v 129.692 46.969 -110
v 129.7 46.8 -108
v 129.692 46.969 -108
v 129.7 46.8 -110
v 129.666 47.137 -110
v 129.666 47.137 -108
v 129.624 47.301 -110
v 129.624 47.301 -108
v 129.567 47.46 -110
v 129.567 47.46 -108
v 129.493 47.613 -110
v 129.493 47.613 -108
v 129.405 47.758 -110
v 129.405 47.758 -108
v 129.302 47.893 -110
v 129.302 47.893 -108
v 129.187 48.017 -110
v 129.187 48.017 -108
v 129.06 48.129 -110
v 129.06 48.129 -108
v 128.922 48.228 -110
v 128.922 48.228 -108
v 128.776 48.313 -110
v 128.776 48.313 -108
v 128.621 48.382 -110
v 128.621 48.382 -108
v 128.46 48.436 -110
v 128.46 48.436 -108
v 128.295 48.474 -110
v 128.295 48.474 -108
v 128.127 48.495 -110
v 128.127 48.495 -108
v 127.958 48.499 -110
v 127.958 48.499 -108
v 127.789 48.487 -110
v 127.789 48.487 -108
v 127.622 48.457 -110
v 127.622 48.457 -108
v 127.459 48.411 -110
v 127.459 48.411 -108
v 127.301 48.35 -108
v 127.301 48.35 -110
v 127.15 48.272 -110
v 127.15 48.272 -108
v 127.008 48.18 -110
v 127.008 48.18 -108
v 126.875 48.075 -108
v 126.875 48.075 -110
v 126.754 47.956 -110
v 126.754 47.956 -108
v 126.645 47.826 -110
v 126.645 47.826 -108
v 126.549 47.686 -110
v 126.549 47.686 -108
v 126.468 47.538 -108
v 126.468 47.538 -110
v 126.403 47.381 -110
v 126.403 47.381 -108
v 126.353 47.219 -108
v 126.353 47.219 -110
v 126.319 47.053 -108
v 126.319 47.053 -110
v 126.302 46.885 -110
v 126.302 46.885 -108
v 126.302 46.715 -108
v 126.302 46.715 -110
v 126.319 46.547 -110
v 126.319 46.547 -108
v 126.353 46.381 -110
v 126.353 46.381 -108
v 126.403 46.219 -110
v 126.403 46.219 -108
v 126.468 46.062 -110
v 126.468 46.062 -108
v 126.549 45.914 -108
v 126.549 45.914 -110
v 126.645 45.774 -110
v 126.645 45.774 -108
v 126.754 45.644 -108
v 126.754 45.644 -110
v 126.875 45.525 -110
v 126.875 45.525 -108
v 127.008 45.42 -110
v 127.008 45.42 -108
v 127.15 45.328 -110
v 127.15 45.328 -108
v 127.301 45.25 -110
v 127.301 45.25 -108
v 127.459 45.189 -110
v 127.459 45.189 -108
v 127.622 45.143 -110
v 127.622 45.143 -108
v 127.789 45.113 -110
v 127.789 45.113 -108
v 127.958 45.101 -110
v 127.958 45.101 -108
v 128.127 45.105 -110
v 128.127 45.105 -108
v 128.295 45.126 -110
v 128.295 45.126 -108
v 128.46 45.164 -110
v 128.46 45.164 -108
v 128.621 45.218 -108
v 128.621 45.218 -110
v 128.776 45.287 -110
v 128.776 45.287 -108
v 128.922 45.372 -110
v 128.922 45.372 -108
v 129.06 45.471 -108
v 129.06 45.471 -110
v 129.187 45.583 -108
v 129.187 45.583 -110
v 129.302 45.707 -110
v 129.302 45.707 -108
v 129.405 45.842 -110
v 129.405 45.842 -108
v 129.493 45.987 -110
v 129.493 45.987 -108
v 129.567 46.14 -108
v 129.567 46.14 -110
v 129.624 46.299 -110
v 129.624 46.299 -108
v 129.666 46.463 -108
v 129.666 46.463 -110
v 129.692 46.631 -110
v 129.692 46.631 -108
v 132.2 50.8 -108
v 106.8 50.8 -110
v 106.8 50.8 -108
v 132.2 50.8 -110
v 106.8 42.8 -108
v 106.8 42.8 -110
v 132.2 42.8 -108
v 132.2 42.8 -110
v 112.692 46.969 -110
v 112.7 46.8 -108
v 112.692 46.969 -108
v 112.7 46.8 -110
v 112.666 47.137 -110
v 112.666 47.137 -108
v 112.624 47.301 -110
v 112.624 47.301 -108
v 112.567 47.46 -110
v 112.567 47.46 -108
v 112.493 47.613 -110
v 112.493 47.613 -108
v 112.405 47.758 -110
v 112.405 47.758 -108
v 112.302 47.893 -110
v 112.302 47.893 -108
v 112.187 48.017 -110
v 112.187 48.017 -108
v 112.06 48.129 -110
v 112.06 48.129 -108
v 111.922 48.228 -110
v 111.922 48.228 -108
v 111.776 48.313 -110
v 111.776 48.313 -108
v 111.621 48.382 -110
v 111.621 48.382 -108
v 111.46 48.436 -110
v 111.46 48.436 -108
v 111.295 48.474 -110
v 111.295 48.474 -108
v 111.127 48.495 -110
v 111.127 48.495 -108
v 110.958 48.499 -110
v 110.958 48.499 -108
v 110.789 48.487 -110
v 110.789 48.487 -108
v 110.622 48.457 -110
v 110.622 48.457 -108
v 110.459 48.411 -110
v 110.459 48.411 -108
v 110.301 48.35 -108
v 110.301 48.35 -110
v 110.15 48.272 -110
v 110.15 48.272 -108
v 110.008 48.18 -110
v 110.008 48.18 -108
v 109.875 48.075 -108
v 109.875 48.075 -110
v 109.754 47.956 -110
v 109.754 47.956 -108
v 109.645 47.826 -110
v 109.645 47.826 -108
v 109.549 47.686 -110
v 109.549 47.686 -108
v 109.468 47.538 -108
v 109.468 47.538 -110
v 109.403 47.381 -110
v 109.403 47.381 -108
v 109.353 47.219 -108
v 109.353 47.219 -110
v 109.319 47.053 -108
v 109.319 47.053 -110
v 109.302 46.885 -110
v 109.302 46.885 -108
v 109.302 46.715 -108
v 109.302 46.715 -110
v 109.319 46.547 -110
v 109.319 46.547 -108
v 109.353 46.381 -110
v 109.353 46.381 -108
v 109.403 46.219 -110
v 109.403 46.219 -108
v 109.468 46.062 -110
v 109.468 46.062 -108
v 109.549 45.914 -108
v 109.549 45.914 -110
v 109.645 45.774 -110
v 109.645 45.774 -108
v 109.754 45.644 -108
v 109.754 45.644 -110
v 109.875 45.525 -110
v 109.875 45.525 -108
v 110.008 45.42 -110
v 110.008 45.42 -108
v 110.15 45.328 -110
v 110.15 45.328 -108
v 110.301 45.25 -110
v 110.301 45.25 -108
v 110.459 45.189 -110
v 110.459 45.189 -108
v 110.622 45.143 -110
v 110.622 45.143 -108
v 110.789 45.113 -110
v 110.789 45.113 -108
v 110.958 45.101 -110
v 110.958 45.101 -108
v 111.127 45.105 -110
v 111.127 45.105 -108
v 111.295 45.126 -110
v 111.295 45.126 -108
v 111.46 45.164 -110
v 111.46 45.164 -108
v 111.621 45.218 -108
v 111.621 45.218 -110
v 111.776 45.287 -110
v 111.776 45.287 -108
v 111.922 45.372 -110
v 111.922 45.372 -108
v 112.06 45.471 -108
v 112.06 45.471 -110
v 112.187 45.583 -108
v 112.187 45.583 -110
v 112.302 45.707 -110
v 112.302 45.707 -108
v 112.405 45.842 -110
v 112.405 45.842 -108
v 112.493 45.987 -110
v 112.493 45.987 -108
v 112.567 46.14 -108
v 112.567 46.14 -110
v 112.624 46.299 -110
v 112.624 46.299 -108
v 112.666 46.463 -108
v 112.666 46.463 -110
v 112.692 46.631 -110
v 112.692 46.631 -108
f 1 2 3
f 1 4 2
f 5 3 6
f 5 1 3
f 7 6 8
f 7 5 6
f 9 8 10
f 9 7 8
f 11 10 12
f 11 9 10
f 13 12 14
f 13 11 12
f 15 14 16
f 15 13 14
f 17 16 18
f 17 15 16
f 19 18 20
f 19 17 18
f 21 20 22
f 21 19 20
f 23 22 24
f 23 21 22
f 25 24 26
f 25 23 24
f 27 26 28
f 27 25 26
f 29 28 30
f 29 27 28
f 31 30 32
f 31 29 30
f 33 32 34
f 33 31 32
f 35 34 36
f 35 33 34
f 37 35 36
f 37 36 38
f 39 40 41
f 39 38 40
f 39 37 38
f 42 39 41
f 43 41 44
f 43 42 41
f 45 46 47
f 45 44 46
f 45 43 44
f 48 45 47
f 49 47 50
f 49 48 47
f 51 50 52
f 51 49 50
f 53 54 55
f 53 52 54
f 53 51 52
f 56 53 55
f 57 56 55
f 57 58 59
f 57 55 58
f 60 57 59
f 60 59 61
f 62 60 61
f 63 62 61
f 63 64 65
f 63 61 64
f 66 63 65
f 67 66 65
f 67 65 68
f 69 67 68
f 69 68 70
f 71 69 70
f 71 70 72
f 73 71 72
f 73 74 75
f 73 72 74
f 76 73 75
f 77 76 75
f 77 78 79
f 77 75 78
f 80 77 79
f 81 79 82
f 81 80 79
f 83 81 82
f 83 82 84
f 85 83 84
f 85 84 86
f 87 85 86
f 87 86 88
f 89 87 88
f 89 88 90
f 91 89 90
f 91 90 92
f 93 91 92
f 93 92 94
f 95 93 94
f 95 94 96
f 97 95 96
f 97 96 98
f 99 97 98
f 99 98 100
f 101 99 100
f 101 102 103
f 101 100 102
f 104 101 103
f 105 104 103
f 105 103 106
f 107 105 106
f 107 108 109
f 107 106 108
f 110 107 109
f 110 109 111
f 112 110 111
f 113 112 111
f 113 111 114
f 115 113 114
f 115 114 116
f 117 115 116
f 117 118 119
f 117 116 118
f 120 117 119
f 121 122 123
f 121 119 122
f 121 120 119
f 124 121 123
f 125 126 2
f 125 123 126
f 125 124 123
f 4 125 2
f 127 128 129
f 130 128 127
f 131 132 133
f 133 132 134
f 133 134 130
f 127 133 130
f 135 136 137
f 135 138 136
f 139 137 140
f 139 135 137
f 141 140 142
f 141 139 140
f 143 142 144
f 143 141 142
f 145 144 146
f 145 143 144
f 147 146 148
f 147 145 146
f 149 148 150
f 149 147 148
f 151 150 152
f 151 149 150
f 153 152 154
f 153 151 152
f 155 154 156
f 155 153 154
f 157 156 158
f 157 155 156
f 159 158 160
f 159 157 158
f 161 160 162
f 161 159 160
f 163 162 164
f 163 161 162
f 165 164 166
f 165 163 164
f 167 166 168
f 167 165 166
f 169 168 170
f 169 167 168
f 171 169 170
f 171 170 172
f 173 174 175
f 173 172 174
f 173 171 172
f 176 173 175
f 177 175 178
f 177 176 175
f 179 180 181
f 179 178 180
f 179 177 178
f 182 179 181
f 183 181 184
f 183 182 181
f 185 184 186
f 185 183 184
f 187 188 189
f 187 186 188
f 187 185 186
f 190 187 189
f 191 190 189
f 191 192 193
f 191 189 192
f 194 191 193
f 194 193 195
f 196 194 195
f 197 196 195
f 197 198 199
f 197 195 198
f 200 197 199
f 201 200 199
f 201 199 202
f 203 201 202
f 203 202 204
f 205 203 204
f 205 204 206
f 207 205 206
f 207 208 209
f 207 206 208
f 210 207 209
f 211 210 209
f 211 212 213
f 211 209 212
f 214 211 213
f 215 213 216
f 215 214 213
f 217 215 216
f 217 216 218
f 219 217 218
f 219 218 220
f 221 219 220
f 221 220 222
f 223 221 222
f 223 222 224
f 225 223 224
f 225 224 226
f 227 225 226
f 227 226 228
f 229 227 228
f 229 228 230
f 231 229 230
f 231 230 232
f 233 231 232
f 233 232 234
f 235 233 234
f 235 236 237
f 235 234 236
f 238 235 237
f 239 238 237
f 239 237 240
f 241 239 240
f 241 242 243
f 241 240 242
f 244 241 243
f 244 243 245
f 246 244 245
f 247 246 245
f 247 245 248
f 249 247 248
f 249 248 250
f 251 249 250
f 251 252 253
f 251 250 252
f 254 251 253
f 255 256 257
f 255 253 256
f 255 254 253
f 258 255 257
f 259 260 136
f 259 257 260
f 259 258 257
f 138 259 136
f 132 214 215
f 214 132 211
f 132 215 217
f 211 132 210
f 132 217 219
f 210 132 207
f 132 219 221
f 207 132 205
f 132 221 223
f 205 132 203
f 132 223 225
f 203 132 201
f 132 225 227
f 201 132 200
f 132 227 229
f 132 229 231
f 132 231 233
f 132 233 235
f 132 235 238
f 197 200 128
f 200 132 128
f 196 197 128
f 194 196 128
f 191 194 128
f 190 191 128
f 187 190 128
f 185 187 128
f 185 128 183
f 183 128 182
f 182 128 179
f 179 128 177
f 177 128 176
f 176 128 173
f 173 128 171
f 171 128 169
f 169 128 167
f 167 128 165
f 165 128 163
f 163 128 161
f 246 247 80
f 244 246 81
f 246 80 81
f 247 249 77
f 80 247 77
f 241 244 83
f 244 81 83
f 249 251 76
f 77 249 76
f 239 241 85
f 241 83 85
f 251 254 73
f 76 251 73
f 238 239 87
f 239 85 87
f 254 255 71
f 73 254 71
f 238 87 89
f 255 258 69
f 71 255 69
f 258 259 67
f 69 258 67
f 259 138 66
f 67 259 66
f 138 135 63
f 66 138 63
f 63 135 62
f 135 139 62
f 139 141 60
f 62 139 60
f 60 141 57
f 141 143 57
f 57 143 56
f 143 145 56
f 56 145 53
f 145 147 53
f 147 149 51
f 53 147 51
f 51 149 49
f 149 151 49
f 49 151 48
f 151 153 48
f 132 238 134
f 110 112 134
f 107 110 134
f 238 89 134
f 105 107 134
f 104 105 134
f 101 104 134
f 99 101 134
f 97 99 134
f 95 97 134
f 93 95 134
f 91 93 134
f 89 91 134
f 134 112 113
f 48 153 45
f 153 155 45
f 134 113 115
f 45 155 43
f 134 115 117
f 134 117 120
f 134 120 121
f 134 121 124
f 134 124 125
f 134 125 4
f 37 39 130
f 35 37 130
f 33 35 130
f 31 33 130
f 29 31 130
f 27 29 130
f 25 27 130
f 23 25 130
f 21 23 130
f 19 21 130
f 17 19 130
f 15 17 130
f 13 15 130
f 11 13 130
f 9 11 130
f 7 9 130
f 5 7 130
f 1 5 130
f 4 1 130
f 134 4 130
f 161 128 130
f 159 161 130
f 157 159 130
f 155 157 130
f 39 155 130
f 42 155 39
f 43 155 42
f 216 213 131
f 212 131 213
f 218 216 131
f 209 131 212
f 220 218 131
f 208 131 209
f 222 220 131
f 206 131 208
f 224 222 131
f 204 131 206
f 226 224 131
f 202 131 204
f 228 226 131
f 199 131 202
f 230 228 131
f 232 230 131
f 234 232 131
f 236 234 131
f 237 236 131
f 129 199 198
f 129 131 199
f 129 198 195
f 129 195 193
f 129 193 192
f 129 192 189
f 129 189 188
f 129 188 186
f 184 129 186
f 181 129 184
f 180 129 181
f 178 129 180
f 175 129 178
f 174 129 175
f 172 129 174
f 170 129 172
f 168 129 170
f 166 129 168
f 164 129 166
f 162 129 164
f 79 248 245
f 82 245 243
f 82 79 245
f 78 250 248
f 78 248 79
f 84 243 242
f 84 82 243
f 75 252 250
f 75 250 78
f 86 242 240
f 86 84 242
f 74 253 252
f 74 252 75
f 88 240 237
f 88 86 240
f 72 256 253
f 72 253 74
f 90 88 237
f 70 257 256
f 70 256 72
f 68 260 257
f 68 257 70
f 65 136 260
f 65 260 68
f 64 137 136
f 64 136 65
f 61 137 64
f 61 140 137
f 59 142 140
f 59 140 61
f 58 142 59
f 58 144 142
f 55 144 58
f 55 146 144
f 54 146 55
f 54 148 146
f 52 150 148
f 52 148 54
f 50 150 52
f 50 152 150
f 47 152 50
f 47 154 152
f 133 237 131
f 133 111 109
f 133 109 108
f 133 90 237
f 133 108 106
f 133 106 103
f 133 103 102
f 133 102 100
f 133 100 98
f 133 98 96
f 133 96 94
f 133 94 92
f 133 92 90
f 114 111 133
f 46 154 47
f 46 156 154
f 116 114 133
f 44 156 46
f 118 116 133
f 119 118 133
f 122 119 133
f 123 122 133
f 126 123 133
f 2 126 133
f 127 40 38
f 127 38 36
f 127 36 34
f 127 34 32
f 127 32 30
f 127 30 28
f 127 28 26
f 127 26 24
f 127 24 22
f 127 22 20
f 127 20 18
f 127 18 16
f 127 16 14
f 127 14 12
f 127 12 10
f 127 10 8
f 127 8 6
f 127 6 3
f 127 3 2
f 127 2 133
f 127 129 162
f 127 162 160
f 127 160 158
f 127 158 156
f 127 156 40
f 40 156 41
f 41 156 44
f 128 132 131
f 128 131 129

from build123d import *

# Parameters (mm, degrees)
CYLINDER009_R     = 1.7
CYLINDER009_DEPTH = 30
CYLINDER007_R     = 1.7
CYLINDER007_DEPTH = 30
BOX015_W          = 25.4
BOX015_H          = 8
BOX015_DEPTH      = 2


with BuildPart() as cylinder009:
    # Cylinder009 → Cylinder009 (new body)
    with BuildSketch(Plane(origin=(128, 46.8, -127), x_dir=(1, 0, 0), z_dir=(0, 0, 1))):
        Circle(CYLINDER009_R)
    extrude(amount=CYLINDER009_DEPTH)


with BuildPart() as cylinder007:
    # Cylinder007 → Cylinder007 (new body)
    with BuildSketch(Plane(origin=(111, 46.8, -127), x_dir=(1, 0, 0), z_dir=(0, 0, 1))):
        Circle(CYLINDER007_R)
    extrude(amount=CYLINDER007_DEPTH)


with BuildPart() as cut010:
    # Box015 → Box015 (new body)
    with BuildSketch(Plane(origin=(106.8, 42.8, -110), x_dir=(1, 0, 0), z_dir=(0, 0, 1))):
        with Locations((12.7, 4)):
            Rectangle(BOX015_W, BOX015_H)
    extrude(amount=BOX015_DEPTH)

    # Cut009: cut Cylinder007
    add(cylinder007.part, mode=Mode.SUBTRACT)

    # Cut010: cut Cylinder009
    add(cylinder009.part, mode=Mode.SUBTRACT)


solid = cut010.part
